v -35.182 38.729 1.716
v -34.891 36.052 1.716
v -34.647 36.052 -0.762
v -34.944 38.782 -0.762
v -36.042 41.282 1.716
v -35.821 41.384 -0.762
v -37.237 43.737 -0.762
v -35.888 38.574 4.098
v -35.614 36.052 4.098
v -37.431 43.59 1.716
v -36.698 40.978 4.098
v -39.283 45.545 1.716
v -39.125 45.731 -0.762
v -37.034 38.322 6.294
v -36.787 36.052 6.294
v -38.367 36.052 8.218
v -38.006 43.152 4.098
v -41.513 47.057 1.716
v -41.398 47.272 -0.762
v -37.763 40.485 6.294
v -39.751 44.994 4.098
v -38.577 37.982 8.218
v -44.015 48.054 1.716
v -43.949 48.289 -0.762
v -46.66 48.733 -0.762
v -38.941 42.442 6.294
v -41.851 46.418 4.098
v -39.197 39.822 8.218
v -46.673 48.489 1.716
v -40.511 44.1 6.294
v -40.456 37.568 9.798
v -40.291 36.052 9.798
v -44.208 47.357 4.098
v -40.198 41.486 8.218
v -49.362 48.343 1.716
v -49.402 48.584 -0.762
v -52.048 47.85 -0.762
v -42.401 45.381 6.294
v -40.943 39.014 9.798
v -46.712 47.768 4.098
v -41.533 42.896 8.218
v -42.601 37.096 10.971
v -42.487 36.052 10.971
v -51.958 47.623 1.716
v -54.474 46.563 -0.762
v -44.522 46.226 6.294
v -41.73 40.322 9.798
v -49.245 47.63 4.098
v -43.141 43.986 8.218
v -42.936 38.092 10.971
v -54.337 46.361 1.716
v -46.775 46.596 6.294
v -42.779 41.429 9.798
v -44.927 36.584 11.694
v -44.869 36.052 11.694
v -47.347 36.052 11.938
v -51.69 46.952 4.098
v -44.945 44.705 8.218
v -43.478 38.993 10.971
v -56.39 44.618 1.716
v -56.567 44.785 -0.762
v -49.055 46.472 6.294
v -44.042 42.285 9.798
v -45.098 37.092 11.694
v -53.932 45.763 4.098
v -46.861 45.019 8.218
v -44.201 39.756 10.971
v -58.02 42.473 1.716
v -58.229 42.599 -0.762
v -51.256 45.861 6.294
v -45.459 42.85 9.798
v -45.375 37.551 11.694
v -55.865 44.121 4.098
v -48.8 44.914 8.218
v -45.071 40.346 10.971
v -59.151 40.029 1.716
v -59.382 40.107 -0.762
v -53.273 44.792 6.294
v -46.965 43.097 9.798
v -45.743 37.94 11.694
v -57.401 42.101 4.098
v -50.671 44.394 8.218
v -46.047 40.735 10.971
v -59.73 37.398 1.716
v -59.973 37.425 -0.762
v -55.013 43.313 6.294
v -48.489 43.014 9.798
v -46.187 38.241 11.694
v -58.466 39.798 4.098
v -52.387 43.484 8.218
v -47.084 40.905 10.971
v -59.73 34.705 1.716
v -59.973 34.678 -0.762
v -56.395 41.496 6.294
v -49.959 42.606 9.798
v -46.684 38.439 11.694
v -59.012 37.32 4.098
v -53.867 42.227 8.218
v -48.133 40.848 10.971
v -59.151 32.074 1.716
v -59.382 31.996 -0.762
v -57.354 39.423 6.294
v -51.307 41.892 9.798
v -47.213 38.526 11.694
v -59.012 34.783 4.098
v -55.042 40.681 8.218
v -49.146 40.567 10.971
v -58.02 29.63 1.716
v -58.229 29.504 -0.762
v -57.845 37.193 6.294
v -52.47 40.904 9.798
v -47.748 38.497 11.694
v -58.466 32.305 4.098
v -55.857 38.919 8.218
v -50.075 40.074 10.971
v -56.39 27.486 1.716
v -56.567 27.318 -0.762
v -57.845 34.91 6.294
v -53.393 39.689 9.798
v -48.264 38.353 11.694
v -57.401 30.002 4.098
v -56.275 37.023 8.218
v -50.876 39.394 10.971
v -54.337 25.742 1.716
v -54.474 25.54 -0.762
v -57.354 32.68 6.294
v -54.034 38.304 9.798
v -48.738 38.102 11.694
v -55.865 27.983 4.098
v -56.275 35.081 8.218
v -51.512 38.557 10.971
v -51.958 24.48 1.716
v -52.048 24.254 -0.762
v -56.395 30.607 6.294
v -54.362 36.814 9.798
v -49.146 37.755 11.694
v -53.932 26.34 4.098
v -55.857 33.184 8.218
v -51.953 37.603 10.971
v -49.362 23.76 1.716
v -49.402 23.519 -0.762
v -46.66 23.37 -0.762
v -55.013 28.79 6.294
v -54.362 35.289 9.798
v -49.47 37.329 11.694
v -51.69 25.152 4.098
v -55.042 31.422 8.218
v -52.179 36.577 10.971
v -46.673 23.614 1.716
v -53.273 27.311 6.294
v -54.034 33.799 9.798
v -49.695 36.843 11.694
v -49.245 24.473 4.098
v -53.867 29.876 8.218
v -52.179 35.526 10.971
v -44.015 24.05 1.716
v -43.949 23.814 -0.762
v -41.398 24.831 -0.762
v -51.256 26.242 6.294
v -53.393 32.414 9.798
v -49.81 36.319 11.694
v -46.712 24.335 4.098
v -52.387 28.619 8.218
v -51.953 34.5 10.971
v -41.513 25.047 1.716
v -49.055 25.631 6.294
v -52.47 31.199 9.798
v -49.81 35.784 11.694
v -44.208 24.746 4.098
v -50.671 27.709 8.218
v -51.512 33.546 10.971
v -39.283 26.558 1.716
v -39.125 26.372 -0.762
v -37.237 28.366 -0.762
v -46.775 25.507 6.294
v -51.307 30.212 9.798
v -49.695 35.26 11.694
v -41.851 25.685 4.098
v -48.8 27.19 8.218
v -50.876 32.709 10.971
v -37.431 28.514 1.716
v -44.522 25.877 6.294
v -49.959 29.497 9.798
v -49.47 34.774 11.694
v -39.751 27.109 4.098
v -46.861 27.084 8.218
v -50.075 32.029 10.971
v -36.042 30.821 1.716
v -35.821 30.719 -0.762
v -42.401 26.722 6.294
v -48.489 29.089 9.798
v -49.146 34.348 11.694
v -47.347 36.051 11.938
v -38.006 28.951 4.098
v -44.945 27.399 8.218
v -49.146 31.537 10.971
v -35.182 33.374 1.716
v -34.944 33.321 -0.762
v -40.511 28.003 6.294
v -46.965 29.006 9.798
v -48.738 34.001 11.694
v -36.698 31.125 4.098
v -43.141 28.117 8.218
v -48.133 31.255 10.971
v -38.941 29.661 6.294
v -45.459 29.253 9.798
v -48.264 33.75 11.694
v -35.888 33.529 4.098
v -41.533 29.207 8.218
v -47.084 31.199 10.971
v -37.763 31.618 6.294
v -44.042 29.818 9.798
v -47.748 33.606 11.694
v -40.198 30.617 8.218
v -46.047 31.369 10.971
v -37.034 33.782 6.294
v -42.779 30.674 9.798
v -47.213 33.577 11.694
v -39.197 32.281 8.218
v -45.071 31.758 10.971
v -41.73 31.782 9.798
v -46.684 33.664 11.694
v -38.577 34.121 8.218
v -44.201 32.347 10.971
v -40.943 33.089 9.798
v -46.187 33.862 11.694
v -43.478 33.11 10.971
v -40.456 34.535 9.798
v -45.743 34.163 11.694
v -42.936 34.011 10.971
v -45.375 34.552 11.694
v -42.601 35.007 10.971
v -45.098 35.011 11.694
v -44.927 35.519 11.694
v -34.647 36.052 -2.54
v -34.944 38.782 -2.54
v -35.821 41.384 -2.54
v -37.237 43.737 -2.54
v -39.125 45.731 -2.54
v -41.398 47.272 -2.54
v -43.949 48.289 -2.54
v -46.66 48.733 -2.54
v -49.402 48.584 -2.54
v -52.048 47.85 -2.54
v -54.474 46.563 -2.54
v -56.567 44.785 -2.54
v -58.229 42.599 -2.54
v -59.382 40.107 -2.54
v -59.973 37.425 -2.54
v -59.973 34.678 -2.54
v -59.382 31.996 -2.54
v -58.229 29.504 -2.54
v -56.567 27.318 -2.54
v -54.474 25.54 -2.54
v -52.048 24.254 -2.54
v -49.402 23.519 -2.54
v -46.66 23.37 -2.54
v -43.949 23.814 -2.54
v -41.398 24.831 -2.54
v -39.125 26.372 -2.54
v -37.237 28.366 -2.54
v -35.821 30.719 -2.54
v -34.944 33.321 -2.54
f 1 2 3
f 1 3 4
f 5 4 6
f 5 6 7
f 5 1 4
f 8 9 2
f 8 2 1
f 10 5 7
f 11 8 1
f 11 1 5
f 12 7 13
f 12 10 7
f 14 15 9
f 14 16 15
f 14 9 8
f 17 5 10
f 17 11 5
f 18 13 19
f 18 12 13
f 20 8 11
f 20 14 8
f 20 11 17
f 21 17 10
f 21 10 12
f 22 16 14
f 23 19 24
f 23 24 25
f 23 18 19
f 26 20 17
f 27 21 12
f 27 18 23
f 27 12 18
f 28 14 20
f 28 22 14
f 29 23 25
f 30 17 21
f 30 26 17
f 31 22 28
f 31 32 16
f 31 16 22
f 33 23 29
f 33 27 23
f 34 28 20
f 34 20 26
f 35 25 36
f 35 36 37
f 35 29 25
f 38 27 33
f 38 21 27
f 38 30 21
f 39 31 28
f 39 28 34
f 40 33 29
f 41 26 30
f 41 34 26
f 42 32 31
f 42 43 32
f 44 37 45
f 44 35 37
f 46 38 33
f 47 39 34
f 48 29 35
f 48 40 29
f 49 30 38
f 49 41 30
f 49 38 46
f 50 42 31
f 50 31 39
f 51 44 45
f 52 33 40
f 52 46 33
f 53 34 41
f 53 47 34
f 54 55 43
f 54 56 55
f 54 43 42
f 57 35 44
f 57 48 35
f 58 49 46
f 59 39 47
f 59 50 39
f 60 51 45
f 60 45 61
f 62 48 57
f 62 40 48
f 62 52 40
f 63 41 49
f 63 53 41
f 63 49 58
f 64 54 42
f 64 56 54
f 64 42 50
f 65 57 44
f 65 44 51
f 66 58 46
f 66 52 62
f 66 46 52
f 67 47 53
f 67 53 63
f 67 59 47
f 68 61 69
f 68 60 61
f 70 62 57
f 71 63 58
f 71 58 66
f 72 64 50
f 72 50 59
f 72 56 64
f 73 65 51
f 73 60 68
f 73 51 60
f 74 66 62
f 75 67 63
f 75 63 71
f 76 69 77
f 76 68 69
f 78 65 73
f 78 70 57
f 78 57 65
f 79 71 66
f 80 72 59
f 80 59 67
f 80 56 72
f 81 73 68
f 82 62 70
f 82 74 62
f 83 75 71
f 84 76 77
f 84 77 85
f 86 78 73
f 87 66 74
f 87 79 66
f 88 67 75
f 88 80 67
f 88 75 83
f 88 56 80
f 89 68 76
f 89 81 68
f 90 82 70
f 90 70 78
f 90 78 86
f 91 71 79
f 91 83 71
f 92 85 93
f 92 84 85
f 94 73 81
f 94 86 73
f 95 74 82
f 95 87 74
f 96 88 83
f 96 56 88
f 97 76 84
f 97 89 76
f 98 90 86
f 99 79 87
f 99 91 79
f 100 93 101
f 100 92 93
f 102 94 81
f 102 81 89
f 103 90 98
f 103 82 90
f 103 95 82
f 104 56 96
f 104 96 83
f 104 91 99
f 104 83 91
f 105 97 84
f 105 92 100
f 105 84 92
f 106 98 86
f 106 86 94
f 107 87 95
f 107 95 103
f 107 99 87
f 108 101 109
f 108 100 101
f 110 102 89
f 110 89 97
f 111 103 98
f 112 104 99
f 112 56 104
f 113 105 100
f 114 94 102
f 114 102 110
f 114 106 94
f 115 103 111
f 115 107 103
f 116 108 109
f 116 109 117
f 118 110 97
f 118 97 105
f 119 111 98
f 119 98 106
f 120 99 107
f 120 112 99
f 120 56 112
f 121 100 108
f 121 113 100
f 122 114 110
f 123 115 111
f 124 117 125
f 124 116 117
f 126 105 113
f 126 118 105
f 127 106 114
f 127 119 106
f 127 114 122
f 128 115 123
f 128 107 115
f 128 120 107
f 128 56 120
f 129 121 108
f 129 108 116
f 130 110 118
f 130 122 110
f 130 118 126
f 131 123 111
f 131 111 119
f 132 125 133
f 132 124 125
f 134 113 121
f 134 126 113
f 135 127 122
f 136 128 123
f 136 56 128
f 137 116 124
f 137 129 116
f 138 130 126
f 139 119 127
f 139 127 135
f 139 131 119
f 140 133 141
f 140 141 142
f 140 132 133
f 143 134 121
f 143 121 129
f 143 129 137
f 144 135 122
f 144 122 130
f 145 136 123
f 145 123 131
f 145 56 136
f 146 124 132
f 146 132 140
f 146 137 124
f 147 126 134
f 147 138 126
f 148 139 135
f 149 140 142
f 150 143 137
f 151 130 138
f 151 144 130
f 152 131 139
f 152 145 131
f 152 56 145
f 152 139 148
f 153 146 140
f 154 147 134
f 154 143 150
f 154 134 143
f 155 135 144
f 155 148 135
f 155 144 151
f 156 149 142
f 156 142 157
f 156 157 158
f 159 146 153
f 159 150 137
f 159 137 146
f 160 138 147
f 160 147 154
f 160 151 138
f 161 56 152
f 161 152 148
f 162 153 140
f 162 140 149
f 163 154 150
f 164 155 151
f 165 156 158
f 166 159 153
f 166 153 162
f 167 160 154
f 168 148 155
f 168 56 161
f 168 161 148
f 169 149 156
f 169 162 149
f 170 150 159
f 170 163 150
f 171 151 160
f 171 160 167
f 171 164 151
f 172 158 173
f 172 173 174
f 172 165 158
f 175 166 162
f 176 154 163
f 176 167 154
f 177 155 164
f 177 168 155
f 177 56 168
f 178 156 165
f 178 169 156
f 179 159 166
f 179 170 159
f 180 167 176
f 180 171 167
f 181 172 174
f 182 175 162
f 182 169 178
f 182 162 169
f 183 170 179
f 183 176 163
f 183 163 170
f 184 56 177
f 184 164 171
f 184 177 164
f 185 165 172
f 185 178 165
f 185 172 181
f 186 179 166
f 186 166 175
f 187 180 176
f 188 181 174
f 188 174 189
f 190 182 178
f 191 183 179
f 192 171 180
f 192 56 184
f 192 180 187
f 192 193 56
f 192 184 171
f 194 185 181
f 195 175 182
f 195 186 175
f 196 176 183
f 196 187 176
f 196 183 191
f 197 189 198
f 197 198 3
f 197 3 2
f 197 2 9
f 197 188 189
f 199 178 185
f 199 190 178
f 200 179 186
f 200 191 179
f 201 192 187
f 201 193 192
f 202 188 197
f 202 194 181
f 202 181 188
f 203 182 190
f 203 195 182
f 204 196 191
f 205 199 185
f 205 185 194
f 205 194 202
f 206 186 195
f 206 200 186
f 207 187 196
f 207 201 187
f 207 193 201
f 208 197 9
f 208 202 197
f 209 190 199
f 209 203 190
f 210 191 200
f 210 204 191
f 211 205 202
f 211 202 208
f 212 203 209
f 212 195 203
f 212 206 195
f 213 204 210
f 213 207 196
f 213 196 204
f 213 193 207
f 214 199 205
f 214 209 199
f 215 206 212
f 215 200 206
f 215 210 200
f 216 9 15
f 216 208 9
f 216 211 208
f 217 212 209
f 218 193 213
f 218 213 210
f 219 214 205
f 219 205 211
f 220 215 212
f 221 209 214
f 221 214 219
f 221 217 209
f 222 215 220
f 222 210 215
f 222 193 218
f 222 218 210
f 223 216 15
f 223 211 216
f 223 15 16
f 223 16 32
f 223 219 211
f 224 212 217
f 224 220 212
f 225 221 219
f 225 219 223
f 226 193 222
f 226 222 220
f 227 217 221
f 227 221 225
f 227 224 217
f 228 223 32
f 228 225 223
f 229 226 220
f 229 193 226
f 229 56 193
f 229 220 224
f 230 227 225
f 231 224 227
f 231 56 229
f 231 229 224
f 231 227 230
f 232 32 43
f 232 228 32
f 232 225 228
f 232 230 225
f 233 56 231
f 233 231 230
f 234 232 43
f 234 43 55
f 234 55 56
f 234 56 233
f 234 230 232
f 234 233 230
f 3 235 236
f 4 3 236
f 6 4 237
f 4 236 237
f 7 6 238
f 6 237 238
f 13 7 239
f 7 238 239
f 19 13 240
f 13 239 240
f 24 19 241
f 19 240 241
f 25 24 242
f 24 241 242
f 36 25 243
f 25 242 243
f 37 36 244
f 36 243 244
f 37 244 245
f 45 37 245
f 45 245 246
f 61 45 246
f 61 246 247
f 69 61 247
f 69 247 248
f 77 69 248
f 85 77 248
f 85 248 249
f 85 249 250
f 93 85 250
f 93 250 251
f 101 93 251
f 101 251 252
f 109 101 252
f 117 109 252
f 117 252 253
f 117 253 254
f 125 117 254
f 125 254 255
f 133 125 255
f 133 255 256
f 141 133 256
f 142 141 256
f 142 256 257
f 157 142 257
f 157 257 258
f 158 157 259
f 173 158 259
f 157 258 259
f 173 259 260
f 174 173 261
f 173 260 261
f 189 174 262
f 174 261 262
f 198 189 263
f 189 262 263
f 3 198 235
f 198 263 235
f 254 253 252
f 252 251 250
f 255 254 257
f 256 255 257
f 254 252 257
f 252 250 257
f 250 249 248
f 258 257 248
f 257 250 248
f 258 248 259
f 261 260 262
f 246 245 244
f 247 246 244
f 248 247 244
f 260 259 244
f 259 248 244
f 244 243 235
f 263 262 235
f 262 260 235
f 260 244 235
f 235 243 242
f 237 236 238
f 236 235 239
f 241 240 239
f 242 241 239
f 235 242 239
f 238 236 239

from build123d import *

# Parameters (mm, degrees)
F0_R          = 12.7
F1_DEPTH      = 11.938
F1_DEPTH_BACK = 2.54
F2_R          = 12.6999
F3_DEPTH      = 0.254


# Not quite as in the source:
# - a fillet or chamfer is up to 0.001 mm smaller than in the source, because OpenCascade refuses the exact size


with BuildPart() as f1:
    # F0 (on Top) → F1 (new body, two sides)
    with BuildSketch(Plane.XY) as f1_sk:
        with Locations((-47.3470948637, 36.0515639186)):
            Circle(F0_R)
    extrude(amount=F1_DEPTH)
    extrude(f1_sk.sketch, amount=-F1_DEPTH_BACK)

    # F2 (radius 12.7 in the source; OpenCascade refuses exactly that, so slightly less here)
    f2_edges = [f1.edges().sort_by_distance(p)[0] for p in [
        (-60.047095, 36.051564, 11.938),
    ]]
    fillet(f2_edges, radius=F2_R)

    # F3 (add): a face of the model
    f3_faces = [f1.faces().sort_by_distance(p)[0] for p in [
        (-47.3470948637, 36.0515639186, -2.54),
    ]]
    extrude(f3_faces, amount=-F3_DEPTH)


solid = f1.part
